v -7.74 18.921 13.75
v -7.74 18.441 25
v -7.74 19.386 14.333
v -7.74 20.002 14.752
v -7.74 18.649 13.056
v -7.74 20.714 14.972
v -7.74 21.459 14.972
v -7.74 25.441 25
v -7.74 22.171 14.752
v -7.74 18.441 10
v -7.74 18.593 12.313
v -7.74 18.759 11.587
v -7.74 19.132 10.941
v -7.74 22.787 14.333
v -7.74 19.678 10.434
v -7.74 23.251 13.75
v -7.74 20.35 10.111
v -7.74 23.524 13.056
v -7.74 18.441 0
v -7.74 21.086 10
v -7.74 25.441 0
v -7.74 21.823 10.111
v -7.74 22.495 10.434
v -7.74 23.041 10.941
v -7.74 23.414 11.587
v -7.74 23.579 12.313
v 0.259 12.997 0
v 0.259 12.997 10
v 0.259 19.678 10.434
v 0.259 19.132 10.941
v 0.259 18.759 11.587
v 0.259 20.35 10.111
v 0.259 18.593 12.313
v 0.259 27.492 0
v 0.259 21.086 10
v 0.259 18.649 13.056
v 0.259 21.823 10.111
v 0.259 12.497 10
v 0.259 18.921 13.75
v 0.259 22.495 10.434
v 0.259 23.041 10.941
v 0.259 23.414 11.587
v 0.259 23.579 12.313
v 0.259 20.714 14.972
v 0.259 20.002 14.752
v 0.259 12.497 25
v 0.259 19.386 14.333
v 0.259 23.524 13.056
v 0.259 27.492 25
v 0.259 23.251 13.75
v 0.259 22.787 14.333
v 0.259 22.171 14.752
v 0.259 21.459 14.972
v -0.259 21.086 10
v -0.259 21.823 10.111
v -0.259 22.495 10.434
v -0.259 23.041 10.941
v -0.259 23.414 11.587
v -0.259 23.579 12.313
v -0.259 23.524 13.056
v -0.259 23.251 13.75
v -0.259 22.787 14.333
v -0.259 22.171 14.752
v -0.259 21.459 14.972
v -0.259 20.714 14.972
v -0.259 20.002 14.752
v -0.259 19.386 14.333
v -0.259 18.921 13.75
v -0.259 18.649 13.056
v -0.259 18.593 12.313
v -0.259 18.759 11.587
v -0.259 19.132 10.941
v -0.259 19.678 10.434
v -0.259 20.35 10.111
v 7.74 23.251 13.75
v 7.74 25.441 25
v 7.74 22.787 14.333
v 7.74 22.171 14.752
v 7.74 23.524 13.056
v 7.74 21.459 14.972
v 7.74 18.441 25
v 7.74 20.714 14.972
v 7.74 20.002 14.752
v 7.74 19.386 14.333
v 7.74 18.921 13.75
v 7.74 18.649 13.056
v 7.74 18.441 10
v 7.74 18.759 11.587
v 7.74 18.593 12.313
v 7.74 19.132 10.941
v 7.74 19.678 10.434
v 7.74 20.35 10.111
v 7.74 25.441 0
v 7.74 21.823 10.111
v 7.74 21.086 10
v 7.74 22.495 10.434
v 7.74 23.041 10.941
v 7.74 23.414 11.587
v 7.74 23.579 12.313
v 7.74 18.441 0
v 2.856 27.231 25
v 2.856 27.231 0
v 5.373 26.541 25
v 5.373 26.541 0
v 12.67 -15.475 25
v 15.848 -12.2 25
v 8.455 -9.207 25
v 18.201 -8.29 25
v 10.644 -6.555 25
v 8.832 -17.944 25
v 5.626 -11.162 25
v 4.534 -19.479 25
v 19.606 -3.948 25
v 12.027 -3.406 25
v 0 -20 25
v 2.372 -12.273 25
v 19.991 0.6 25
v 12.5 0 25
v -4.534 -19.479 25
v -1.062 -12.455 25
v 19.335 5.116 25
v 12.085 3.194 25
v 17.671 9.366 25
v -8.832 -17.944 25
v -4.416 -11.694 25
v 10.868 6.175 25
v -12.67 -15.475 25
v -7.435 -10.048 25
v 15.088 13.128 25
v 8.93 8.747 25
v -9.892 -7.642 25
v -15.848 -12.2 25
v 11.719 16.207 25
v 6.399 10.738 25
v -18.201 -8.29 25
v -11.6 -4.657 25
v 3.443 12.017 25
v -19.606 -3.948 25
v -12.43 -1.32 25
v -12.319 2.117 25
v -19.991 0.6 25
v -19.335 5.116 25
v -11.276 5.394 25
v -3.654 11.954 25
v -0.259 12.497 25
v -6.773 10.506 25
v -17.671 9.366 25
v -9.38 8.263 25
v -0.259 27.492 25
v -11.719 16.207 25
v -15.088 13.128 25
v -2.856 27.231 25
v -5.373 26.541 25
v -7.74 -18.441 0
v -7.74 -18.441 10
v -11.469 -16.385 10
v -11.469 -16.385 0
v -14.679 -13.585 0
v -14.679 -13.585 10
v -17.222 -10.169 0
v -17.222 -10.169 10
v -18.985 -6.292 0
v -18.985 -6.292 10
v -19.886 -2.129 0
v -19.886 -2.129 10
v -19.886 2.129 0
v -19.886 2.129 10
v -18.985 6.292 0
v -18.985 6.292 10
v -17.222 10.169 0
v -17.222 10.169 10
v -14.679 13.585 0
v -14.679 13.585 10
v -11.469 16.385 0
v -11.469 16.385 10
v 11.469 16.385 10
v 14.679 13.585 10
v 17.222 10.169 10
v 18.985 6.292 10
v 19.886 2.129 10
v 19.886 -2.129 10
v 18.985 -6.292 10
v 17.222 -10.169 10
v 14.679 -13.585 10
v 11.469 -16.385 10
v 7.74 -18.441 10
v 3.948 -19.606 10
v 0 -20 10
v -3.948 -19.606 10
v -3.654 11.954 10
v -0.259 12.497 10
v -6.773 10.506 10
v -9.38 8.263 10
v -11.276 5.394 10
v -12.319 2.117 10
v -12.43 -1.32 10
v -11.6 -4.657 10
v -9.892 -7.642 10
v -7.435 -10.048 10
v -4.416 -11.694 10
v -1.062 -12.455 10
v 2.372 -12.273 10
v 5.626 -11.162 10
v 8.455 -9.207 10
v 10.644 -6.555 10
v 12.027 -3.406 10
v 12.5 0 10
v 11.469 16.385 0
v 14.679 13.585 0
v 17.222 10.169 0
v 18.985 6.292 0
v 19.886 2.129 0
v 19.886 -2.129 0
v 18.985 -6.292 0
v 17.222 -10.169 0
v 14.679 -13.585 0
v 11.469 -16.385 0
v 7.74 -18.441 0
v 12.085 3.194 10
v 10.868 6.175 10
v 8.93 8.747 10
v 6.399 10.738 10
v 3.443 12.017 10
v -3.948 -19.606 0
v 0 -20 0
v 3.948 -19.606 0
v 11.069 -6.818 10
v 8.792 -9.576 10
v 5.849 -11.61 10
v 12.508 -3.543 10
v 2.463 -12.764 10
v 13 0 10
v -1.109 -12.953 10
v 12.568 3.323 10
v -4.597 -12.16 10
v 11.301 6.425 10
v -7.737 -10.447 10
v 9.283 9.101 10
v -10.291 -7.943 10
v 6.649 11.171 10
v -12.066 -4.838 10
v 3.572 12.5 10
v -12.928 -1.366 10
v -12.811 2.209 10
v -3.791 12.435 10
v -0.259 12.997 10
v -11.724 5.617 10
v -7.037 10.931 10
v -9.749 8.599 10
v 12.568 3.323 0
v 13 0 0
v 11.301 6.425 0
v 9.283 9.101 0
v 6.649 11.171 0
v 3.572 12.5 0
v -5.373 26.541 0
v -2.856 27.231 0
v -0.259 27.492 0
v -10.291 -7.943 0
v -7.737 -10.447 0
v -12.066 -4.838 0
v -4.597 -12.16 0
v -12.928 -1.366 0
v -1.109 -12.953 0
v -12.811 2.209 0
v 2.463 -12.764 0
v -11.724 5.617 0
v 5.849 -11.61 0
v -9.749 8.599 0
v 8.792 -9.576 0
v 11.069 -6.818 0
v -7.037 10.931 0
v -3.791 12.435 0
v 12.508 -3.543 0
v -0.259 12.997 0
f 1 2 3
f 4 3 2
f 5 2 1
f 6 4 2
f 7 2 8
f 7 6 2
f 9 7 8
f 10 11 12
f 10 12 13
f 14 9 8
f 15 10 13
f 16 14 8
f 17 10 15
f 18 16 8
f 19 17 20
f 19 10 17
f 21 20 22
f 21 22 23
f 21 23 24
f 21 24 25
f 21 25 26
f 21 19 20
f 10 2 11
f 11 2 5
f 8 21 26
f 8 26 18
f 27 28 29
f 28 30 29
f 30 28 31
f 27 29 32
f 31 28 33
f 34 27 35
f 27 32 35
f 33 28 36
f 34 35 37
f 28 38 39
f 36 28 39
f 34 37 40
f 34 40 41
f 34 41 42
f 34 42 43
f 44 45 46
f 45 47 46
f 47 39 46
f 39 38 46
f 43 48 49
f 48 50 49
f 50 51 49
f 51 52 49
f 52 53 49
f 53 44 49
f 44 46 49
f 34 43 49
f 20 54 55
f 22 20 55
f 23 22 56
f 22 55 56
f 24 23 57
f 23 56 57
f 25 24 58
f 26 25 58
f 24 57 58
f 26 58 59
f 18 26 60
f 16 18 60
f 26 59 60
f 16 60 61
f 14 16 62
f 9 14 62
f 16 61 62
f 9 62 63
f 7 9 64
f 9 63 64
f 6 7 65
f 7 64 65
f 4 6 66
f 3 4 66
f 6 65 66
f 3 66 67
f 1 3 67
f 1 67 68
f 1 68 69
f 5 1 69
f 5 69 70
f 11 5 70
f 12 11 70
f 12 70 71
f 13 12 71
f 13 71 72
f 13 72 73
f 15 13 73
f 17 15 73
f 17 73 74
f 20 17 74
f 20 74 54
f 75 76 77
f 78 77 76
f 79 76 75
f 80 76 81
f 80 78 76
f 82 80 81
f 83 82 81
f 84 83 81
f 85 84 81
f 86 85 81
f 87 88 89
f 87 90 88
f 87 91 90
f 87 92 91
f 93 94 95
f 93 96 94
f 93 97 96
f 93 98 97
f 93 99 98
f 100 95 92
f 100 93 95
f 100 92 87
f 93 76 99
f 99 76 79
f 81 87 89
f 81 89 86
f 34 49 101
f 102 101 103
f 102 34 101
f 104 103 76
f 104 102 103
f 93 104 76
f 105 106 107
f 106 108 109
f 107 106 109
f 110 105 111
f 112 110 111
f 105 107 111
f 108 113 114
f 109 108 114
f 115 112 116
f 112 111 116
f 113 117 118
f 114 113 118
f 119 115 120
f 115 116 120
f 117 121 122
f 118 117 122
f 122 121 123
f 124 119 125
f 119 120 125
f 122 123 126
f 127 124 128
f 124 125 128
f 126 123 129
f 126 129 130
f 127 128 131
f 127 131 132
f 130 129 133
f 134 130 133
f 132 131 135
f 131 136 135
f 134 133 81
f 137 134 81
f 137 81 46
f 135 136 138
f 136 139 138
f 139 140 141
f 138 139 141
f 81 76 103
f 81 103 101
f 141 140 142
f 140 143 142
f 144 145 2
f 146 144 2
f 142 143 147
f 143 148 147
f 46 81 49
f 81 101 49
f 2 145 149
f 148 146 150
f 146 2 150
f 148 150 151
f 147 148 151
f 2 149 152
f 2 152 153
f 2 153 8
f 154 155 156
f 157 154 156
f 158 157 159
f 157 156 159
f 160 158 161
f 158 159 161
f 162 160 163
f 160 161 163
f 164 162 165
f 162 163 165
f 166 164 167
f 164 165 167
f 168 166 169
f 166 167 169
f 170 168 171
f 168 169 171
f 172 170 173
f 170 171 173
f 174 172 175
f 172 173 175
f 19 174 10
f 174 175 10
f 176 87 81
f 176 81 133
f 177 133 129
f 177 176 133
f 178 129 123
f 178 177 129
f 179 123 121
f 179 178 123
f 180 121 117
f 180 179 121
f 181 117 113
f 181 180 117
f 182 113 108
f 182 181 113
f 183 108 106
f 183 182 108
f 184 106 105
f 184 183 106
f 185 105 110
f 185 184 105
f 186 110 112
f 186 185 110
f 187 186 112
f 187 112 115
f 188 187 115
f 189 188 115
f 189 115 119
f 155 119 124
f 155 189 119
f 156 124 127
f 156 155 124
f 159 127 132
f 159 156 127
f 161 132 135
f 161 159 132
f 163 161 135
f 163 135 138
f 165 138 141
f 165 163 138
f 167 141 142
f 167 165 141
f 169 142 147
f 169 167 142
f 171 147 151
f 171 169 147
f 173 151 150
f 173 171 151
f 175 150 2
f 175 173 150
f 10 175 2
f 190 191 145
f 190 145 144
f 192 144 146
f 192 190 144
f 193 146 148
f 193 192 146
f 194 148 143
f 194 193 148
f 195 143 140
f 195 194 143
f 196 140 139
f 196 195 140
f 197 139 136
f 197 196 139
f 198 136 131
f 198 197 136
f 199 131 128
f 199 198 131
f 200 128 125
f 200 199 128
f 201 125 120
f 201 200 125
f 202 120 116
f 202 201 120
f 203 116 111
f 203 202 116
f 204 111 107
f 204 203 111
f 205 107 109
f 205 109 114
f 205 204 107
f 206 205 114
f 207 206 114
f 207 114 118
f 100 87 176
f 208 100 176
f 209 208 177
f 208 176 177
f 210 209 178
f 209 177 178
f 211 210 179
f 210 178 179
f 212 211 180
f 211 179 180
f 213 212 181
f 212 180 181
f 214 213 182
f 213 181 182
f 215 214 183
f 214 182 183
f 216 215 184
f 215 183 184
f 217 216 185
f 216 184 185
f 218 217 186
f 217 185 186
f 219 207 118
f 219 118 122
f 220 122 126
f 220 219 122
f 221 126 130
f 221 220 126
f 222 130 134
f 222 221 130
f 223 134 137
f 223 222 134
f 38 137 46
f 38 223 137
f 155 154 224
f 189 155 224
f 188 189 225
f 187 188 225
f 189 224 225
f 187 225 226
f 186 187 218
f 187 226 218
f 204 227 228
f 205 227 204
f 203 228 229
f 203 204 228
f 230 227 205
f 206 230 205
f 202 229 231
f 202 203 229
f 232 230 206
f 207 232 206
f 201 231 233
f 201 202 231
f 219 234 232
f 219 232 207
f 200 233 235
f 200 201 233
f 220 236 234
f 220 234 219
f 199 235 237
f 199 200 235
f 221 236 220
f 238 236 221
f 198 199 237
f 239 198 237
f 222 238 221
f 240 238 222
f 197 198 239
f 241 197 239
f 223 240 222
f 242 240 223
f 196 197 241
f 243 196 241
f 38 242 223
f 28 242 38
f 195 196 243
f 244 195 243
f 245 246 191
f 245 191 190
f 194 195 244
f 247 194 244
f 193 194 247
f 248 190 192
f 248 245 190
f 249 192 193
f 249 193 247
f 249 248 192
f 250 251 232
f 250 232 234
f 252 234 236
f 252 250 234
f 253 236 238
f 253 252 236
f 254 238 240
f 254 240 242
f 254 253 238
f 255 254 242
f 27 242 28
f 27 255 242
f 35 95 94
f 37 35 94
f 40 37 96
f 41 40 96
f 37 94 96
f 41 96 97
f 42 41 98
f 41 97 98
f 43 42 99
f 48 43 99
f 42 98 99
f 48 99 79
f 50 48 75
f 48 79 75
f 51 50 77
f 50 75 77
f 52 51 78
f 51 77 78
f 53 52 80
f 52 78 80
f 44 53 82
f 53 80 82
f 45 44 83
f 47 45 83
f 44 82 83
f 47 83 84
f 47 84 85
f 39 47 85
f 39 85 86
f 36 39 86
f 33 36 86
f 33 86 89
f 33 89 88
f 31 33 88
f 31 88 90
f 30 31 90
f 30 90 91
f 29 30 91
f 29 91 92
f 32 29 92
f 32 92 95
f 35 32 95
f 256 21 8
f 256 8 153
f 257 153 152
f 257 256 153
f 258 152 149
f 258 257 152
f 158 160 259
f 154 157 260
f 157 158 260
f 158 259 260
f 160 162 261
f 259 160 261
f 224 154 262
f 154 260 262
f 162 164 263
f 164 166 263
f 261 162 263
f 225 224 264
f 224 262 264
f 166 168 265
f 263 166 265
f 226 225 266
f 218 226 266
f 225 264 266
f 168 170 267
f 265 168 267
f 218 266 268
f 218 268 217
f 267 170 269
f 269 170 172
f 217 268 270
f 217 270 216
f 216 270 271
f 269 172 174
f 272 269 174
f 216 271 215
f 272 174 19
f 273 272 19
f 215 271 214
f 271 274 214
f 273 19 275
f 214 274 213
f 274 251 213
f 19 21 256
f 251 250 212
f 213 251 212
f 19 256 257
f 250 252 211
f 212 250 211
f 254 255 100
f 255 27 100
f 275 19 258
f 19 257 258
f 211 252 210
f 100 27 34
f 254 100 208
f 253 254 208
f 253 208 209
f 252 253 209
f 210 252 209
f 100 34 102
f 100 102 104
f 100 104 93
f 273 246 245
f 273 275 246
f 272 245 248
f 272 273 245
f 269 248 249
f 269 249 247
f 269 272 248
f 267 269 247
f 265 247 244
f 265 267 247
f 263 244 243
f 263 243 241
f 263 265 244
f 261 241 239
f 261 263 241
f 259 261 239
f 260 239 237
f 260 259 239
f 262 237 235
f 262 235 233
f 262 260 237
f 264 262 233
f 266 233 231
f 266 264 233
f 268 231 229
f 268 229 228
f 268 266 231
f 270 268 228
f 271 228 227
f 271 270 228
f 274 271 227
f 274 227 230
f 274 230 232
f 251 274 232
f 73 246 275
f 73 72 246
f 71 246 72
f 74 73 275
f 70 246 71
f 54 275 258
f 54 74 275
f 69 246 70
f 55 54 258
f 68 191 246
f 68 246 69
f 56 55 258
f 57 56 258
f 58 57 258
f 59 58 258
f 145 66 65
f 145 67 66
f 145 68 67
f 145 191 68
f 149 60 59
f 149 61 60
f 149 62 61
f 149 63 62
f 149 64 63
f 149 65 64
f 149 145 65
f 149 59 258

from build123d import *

# Parameters (mm, degrees)
SKETCH_1_R          = 3.5
SKETCH_1_R_2        = 13
EXTRUDE_2_DEPTH     = 10
SKETCH_2_R          = 12.5
EXTRUDE_3_DEPTH     = 15
SKETCH_3_W          = 0.517195108
SKETCH_3_H          = 18.726193104
CUT_EXTRUDE_1_DEPTH = 26
SKETCH_4_R          = 2.5
CUT_EXTRUDE_2_DEPTH = 43.740275714
CUT_EXTRUDE_3_DEPTH = 10


with BuildPart() as part:
    # 草图1 → 凸台-拉伸2 (new body)
    with BuildSketch(Plane.XY):
        with BuildLine():
            Line((-35, -7), (-7.740275714, -18.44147857))
            ThreePointArc((-7.740275714, -18.44147857), (0, -20), (7.740275714, -18.44147857))
            Line((7.740275714, -18.44147857), (35, -7))
            Line((35, -7), (35, 7))
            Line((35, 7), (7.740275714, 18.44147857))
            Line((7.740275714, 18.44147857), (7.740275714, 25.44147857))
            ThreePointArc((7.740275714, 25.44147857), (0, 27.494244152), (-7.740275714, 25.44147857))
            Line((-7.740275714, 25.44147857), (-7.740275714, 18.44147857))
            Line((-7.740275714, 18.44147857), (-35, 7))
            Line((-35, 7), (-35, -7))
        make_face()
        with Locations((-28, 0)):
            Circle(SKETCH_1_R, mode=Mode.SUBTRACT)
        Circle(SKETCH_1_R_2, mode=Mode.SUBTRACT)
        with Locations((28, 0)):
            Circle(SKETCH_1_R, mode=Mode.SUBTRACT)
    extrude(amount=EXTRUDE_2_DEPTH)

    # 草图2 → 凸台-拉伸3 (add)
    with BuildSketch(Plane.XY.offset(10)):
        with BuildLine():
            Line((-7.740275714, 18.44147857), (-7.740275714, 25.44147857))
            ThreePointArc((-7.740275714, 25.44147857), (0, 27.494244152), (7.740275714, 25.44147857))
            Line((7.740275714, 25.44147857), (7.740275714, 18.44147857))
            ThreePointArc((7.740275714, 18.44147857), (0, -20), (-7.740275714, 18.44147857))
        make_face()
        Circle(SKETCH_2_R, mode=Mode.SUBTRACT)
    extrude(amount=EXTRUDE_3_DEPTH)

    # 草图3 → 切除-拉伸1 (cut, through all)
    with BuildSketch(Plane.XY.offset(25)):
        with Locations((0, 21.741202931)):
            Rectangle(SKETCH_3_W, SKETCH_3_H)
    extrude(amount=-CUT_EXTRUDE_1_DEPTH, mode=Mode.SUBTRACT)

    # 草图4 → 切除-拉伸2 (cut, through all)
    with BuildSketch(Plane(origin=(7.740275714, 0, 0), x_dir=(0, 0, -1), z_dir=(1, 0, 0))):
        with Locations((-12.5, 21.086423576)):
            Circle(SKETCH_4_R)
    extrude(amount=-CUT_EXTRUDE_2_DEPTH, mode=Mode.SUBTRACT)

    # 草图6 → 切除-拉伸3 (cut)
    with BuildSketch(Plane.XY.offset(10)):
        with BuildLine():
            Line((-7.740275714, 18.44147857), (-35, 7))
            Line((-35, 7), (-35, -7))
            Line((-35, -7), (-7.740275714, -18.44147857))
            ThreePointArc((-7.740275714, -18.44147857), (-20, 0), (-7.740275714, 18.44147857))
        make_face()
        with BuildLine():
            Line((7.740275714, -18.44147857), (35, -7))
            Line((35, -7), (35, 7))
            Line((35, 7), (7.740275714, 18.44147857))
            ThreePointArc((7.740275714, 18.44147857), (20, 0), (7.740275714, -18.44147857))
        make_face()
    extrude(amount=-CUT_EXTRUDE_3_DEPTH, mode=Mode.SUBTRACT)


solid = part.part
